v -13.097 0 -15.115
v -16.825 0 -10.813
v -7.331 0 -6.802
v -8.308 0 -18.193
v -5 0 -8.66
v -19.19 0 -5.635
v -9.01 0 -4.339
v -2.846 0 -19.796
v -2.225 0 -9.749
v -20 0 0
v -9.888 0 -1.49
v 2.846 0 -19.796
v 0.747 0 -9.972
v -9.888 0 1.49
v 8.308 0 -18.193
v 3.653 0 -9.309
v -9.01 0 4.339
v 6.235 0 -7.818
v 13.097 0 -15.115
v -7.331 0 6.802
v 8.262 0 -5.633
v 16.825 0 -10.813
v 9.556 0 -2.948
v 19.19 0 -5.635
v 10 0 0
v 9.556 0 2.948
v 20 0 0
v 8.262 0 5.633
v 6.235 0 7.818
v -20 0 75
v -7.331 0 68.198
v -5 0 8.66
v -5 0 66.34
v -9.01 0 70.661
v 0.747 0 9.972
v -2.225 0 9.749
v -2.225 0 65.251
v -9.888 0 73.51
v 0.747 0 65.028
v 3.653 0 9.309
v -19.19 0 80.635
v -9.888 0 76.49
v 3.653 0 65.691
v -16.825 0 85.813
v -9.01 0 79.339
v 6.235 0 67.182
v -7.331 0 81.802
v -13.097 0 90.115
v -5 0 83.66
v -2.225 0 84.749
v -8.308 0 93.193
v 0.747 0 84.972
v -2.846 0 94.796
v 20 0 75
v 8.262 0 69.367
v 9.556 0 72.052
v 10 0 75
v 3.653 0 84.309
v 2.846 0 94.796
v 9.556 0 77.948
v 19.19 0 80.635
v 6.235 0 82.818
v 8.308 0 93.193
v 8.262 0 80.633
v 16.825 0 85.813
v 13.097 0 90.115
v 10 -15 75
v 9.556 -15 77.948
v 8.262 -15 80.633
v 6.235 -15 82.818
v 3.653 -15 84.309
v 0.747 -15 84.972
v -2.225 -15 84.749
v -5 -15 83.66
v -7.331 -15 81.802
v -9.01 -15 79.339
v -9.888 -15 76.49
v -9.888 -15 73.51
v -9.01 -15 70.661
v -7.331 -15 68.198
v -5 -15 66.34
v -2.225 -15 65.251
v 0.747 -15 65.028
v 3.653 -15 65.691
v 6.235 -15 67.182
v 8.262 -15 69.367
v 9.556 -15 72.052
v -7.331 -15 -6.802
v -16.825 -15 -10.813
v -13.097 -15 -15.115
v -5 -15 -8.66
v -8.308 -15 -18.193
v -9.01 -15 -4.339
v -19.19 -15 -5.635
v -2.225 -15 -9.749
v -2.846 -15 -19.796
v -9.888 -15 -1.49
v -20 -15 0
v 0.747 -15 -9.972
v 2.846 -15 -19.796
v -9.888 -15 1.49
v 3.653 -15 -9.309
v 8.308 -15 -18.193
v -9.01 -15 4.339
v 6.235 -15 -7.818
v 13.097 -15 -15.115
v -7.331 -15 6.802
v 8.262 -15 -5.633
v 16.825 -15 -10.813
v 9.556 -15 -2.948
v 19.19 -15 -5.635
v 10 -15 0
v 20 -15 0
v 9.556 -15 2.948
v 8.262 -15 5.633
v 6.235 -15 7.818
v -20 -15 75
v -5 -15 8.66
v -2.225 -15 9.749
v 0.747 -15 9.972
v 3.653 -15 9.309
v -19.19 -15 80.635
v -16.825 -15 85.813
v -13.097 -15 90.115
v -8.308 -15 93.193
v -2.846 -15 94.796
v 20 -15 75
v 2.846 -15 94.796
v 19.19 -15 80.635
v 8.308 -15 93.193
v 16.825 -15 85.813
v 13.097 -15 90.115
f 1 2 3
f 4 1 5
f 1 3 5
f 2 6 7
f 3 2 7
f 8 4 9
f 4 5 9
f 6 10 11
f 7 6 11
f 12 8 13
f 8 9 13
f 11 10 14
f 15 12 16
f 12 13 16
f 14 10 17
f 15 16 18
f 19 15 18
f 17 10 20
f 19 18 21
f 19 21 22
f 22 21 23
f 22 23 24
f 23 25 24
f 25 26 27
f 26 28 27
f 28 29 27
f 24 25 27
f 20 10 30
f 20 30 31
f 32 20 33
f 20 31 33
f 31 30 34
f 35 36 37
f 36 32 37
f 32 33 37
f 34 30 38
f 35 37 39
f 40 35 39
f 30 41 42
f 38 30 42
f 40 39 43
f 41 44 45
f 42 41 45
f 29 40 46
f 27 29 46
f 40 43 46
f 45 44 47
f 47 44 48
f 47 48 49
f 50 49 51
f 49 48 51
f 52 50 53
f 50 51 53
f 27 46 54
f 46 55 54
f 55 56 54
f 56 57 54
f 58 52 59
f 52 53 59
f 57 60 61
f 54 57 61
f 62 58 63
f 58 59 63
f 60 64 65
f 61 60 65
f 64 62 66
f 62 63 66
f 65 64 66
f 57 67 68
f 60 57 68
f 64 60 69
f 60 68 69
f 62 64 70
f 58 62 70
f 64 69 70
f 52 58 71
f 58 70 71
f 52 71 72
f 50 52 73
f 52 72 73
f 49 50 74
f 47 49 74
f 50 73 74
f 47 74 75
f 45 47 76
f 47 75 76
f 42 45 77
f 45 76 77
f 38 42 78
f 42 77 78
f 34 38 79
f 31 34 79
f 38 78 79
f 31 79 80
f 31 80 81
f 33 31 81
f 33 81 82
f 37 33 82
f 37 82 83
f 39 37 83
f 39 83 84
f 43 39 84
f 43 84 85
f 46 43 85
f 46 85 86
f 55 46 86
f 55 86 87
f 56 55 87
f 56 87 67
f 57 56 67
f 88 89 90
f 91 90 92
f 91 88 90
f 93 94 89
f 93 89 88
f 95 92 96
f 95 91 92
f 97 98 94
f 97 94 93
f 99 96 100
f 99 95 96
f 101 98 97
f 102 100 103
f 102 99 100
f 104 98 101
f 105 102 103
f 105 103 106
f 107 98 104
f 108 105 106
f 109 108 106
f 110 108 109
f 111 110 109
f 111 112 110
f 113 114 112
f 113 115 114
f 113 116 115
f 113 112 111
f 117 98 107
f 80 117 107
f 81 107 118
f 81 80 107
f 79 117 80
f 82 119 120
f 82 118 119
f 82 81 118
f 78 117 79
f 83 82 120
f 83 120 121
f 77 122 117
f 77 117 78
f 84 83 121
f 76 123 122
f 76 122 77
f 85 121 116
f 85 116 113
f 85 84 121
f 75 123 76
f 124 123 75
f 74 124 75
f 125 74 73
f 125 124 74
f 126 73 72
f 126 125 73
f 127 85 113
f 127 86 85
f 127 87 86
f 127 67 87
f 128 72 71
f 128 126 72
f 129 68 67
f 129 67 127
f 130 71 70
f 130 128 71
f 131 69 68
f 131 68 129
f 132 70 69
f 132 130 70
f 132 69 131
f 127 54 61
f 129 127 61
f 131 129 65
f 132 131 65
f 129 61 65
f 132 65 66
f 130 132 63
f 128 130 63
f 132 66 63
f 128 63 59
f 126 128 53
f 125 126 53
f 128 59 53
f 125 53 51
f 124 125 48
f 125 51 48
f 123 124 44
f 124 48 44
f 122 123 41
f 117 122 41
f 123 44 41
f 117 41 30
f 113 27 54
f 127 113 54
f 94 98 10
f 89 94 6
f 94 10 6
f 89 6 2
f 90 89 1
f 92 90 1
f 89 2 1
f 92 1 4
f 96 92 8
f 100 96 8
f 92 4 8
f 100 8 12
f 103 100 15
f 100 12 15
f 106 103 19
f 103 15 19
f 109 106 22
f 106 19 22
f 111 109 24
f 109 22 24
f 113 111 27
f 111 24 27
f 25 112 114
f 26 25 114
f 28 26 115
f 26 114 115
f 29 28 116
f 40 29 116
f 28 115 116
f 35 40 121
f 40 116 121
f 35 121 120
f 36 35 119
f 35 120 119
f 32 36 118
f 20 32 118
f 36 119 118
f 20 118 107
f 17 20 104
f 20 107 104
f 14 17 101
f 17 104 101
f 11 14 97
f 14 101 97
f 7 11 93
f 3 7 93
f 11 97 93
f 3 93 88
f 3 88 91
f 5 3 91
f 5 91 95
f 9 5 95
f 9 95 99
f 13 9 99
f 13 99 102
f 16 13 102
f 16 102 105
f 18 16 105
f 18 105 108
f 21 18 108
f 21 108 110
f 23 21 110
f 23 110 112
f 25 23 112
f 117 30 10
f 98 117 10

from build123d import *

# Parameters (mm, degrees)
F1_DEPTH = 15
F2_R     = 10
F3_DEPTH = 25


with BuildPart() as f1:
    # F0 (on Front) → F1 (new body)
    with BuildSketch(Plane.XZ):
        with BuildLine():
            ThreePointArc((-20, 75), (0, 55), (20, 75))
            ThreePointArc((20, 75), (0, 95), (-20, 75))
        make_face()
        with BuildLine():
            ThreePointArc((-20, 0), (0, 20), (20, 0))
            Line((20, 0), (20, 75))
            ThreePointArc((20, 75), (0, 55), (-20, 75))
            Line((-20, 75), (-20, 0))
        make_face()
        with BuildLine():
            ThreePointArc((-20, 0), (0, -20), (20, 0))
            ThreePointArc((20, 0), (0, 20), (-20, 0))
        make_face()
    extrude(amount=F1_DEPTH)

    # F2 (on face) → F3 (cut)
    with BuildSketch(Plane.XZ.offset(15)):
        with Locations((0, 75)):
            Circle(F2_R)
        Circle(F2_R)
    extrude(amount=-F3_DEPTH, mode=Mode.SUBTRACT)


solid = f1.part
